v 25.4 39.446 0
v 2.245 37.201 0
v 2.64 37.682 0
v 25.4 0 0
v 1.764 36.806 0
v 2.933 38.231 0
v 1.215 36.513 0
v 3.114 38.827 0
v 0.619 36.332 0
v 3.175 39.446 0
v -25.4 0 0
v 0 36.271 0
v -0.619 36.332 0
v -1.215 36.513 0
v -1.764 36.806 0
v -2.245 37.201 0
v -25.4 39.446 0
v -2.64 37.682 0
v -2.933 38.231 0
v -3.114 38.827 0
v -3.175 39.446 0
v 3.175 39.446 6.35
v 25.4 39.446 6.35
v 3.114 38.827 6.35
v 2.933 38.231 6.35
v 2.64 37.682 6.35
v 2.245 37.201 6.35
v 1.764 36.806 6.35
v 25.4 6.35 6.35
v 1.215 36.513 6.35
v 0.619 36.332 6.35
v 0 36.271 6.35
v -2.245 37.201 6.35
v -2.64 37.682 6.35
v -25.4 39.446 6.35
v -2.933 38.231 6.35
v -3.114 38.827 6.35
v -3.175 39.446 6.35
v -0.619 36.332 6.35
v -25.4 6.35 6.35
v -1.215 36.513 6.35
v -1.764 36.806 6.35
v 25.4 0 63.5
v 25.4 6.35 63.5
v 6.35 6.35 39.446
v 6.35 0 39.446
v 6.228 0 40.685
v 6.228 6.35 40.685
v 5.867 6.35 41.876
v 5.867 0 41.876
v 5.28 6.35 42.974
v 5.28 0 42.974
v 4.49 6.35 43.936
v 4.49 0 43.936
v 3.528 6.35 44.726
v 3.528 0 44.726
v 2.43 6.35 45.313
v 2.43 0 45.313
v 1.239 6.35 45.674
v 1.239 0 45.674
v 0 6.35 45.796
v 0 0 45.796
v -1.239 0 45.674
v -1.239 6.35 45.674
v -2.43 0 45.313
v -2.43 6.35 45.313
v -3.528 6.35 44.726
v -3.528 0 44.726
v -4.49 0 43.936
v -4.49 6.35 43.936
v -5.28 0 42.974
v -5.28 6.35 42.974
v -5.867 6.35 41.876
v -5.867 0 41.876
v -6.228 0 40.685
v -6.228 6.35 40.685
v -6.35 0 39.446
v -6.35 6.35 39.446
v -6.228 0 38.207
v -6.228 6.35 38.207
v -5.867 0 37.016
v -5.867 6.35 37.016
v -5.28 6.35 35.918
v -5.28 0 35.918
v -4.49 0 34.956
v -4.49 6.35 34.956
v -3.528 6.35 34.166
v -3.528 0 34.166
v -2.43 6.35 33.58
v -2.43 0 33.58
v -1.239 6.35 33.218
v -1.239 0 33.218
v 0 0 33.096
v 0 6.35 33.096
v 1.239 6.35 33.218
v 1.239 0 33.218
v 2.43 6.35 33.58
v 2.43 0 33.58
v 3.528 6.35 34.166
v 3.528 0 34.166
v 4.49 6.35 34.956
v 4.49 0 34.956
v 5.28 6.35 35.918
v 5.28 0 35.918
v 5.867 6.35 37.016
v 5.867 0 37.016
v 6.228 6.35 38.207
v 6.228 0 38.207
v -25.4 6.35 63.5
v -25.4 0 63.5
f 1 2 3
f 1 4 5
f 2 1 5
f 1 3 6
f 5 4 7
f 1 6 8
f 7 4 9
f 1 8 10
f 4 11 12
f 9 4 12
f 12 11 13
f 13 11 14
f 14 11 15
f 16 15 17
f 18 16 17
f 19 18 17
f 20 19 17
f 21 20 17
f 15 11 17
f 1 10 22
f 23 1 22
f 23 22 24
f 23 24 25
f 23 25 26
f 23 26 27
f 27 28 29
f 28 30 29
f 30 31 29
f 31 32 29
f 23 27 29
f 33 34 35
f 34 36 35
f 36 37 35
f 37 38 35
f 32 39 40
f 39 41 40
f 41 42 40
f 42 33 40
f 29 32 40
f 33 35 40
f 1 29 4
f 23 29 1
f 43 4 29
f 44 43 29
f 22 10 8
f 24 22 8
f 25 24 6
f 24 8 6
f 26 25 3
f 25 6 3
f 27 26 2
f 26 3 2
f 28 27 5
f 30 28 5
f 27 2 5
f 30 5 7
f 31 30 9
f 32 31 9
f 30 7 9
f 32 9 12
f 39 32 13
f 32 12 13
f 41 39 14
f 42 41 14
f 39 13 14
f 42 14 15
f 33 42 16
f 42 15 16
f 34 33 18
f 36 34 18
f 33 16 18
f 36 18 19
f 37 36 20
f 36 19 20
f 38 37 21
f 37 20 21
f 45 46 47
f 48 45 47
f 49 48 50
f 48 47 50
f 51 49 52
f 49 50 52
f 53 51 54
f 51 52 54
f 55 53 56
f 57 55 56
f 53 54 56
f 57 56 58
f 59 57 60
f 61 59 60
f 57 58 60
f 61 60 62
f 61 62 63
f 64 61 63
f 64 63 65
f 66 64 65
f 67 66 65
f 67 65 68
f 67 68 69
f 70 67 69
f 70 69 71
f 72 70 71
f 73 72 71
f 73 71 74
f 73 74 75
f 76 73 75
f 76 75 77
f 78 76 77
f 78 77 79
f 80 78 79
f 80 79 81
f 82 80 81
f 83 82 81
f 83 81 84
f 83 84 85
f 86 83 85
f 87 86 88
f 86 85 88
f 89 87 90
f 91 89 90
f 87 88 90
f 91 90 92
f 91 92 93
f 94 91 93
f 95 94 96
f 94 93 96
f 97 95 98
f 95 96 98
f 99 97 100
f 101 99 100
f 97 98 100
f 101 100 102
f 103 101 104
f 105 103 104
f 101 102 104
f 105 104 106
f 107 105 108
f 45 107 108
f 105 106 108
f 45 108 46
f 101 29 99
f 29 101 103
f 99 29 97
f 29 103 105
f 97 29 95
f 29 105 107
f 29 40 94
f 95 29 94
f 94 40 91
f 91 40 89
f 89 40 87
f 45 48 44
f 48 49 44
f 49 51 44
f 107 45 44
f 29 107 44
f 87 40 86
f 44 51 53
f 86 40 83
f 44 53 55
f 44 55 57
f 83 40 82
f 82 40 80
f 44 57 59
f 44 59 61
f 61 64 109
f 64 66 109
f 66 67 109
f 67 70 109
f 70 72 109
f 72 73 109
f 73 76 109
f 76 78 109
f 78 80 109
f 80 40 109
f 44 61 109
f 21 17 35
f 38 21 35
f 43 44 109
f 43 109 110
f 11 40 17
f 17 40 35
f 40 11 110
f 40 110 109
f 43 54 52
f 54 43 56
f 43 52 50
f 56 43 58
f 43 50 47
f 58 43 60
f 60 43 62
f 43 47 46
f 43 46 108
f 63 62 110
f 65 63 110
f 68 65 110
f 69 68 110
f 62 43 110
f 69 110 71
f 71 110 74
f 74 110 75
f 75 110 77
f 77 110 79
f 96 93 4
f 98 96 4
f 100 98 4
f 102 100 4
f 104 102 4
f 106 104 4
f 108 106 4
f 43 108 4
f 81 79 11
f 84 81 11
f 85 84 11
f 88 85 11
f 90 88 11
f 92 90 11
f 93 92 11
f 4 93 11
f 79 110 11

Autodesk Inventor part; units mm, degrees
ref_plane "YZ Plane" through (0, 0, 0) normal (1, 0, 0) x (0, 1, 0)
ref_plane "XZ Plane" through (0, 0, 0) normal (0, 1, 0) x (-1, 0, 0)
ref_plane "XY Plane" through (0, 0, 0) normal (0, 0, 1) x (1, 0, 0)
sketch "Sketch1" plane through (0, 0, 0) normal (1, 0, 0) x (0, 1, 0)
  line L0 (0, 0) -> (39.4462, 0)
  line L1 (39.4462, 0) -> (39.4462, 6.35)
  line L2 (39.4462, 6.35) -> (6.35, 6.35)
  line L3 (6.35, 6.35) -> (6.35, 63.5)
  line L4 (6.35, 63.5) -> (0, 63.5)
  line L5 (0, 63.5) -> (0, 0)
  dimension "d0" = 6.35
  dimension "d1" = 6.35
  dimension "d4" = 33.0962
  dimension "d11" = 63.5
extrude "Extrusion1" add sketch "Sketch1" along normal mid plane 50.8
sketch "Sketch2" plane through (25.4, 39.4462, 0) normal (0, 0, -1) x (-1, 0, 0)
  line L0 (50.8, 0) -> (0, 0) projected
  arc A0 (22.225, 0) -> (28.575, 0) centre (25.4, 0) ccw
  line L1 (28.575, 0) -> (22.225, 0)
  point P0 (25.4, -39.4462)
  dimension "d5" = 6.35
extrude "Extrusion2" cut sketch "Sketch2" against normal through all
sketch "Sketch4" plane through (-25.4, 0, 0) normal (0, -1, 0) x (1, 0, 0)
  line L0 (25.4, 0) -> (25.4, 63.5) construction
  line L1 (0, 63.5) -> (50.8, 63.5) construction
  line L2 (0, 39.4462) -> (50.8, 39.4462) construction
  line L3 (50.8, 0) -> (0, 0) construction
  circle A0 centre (25.4, 39.4462) radius 6.35
  dimension "d12" = 39.4462
  dimension "d13" = 12.7
extrude "Extrusion4" cut sketch "Sketch4" against normal through all
properties part number "Angle Bracket for Bevel Gearbox"
